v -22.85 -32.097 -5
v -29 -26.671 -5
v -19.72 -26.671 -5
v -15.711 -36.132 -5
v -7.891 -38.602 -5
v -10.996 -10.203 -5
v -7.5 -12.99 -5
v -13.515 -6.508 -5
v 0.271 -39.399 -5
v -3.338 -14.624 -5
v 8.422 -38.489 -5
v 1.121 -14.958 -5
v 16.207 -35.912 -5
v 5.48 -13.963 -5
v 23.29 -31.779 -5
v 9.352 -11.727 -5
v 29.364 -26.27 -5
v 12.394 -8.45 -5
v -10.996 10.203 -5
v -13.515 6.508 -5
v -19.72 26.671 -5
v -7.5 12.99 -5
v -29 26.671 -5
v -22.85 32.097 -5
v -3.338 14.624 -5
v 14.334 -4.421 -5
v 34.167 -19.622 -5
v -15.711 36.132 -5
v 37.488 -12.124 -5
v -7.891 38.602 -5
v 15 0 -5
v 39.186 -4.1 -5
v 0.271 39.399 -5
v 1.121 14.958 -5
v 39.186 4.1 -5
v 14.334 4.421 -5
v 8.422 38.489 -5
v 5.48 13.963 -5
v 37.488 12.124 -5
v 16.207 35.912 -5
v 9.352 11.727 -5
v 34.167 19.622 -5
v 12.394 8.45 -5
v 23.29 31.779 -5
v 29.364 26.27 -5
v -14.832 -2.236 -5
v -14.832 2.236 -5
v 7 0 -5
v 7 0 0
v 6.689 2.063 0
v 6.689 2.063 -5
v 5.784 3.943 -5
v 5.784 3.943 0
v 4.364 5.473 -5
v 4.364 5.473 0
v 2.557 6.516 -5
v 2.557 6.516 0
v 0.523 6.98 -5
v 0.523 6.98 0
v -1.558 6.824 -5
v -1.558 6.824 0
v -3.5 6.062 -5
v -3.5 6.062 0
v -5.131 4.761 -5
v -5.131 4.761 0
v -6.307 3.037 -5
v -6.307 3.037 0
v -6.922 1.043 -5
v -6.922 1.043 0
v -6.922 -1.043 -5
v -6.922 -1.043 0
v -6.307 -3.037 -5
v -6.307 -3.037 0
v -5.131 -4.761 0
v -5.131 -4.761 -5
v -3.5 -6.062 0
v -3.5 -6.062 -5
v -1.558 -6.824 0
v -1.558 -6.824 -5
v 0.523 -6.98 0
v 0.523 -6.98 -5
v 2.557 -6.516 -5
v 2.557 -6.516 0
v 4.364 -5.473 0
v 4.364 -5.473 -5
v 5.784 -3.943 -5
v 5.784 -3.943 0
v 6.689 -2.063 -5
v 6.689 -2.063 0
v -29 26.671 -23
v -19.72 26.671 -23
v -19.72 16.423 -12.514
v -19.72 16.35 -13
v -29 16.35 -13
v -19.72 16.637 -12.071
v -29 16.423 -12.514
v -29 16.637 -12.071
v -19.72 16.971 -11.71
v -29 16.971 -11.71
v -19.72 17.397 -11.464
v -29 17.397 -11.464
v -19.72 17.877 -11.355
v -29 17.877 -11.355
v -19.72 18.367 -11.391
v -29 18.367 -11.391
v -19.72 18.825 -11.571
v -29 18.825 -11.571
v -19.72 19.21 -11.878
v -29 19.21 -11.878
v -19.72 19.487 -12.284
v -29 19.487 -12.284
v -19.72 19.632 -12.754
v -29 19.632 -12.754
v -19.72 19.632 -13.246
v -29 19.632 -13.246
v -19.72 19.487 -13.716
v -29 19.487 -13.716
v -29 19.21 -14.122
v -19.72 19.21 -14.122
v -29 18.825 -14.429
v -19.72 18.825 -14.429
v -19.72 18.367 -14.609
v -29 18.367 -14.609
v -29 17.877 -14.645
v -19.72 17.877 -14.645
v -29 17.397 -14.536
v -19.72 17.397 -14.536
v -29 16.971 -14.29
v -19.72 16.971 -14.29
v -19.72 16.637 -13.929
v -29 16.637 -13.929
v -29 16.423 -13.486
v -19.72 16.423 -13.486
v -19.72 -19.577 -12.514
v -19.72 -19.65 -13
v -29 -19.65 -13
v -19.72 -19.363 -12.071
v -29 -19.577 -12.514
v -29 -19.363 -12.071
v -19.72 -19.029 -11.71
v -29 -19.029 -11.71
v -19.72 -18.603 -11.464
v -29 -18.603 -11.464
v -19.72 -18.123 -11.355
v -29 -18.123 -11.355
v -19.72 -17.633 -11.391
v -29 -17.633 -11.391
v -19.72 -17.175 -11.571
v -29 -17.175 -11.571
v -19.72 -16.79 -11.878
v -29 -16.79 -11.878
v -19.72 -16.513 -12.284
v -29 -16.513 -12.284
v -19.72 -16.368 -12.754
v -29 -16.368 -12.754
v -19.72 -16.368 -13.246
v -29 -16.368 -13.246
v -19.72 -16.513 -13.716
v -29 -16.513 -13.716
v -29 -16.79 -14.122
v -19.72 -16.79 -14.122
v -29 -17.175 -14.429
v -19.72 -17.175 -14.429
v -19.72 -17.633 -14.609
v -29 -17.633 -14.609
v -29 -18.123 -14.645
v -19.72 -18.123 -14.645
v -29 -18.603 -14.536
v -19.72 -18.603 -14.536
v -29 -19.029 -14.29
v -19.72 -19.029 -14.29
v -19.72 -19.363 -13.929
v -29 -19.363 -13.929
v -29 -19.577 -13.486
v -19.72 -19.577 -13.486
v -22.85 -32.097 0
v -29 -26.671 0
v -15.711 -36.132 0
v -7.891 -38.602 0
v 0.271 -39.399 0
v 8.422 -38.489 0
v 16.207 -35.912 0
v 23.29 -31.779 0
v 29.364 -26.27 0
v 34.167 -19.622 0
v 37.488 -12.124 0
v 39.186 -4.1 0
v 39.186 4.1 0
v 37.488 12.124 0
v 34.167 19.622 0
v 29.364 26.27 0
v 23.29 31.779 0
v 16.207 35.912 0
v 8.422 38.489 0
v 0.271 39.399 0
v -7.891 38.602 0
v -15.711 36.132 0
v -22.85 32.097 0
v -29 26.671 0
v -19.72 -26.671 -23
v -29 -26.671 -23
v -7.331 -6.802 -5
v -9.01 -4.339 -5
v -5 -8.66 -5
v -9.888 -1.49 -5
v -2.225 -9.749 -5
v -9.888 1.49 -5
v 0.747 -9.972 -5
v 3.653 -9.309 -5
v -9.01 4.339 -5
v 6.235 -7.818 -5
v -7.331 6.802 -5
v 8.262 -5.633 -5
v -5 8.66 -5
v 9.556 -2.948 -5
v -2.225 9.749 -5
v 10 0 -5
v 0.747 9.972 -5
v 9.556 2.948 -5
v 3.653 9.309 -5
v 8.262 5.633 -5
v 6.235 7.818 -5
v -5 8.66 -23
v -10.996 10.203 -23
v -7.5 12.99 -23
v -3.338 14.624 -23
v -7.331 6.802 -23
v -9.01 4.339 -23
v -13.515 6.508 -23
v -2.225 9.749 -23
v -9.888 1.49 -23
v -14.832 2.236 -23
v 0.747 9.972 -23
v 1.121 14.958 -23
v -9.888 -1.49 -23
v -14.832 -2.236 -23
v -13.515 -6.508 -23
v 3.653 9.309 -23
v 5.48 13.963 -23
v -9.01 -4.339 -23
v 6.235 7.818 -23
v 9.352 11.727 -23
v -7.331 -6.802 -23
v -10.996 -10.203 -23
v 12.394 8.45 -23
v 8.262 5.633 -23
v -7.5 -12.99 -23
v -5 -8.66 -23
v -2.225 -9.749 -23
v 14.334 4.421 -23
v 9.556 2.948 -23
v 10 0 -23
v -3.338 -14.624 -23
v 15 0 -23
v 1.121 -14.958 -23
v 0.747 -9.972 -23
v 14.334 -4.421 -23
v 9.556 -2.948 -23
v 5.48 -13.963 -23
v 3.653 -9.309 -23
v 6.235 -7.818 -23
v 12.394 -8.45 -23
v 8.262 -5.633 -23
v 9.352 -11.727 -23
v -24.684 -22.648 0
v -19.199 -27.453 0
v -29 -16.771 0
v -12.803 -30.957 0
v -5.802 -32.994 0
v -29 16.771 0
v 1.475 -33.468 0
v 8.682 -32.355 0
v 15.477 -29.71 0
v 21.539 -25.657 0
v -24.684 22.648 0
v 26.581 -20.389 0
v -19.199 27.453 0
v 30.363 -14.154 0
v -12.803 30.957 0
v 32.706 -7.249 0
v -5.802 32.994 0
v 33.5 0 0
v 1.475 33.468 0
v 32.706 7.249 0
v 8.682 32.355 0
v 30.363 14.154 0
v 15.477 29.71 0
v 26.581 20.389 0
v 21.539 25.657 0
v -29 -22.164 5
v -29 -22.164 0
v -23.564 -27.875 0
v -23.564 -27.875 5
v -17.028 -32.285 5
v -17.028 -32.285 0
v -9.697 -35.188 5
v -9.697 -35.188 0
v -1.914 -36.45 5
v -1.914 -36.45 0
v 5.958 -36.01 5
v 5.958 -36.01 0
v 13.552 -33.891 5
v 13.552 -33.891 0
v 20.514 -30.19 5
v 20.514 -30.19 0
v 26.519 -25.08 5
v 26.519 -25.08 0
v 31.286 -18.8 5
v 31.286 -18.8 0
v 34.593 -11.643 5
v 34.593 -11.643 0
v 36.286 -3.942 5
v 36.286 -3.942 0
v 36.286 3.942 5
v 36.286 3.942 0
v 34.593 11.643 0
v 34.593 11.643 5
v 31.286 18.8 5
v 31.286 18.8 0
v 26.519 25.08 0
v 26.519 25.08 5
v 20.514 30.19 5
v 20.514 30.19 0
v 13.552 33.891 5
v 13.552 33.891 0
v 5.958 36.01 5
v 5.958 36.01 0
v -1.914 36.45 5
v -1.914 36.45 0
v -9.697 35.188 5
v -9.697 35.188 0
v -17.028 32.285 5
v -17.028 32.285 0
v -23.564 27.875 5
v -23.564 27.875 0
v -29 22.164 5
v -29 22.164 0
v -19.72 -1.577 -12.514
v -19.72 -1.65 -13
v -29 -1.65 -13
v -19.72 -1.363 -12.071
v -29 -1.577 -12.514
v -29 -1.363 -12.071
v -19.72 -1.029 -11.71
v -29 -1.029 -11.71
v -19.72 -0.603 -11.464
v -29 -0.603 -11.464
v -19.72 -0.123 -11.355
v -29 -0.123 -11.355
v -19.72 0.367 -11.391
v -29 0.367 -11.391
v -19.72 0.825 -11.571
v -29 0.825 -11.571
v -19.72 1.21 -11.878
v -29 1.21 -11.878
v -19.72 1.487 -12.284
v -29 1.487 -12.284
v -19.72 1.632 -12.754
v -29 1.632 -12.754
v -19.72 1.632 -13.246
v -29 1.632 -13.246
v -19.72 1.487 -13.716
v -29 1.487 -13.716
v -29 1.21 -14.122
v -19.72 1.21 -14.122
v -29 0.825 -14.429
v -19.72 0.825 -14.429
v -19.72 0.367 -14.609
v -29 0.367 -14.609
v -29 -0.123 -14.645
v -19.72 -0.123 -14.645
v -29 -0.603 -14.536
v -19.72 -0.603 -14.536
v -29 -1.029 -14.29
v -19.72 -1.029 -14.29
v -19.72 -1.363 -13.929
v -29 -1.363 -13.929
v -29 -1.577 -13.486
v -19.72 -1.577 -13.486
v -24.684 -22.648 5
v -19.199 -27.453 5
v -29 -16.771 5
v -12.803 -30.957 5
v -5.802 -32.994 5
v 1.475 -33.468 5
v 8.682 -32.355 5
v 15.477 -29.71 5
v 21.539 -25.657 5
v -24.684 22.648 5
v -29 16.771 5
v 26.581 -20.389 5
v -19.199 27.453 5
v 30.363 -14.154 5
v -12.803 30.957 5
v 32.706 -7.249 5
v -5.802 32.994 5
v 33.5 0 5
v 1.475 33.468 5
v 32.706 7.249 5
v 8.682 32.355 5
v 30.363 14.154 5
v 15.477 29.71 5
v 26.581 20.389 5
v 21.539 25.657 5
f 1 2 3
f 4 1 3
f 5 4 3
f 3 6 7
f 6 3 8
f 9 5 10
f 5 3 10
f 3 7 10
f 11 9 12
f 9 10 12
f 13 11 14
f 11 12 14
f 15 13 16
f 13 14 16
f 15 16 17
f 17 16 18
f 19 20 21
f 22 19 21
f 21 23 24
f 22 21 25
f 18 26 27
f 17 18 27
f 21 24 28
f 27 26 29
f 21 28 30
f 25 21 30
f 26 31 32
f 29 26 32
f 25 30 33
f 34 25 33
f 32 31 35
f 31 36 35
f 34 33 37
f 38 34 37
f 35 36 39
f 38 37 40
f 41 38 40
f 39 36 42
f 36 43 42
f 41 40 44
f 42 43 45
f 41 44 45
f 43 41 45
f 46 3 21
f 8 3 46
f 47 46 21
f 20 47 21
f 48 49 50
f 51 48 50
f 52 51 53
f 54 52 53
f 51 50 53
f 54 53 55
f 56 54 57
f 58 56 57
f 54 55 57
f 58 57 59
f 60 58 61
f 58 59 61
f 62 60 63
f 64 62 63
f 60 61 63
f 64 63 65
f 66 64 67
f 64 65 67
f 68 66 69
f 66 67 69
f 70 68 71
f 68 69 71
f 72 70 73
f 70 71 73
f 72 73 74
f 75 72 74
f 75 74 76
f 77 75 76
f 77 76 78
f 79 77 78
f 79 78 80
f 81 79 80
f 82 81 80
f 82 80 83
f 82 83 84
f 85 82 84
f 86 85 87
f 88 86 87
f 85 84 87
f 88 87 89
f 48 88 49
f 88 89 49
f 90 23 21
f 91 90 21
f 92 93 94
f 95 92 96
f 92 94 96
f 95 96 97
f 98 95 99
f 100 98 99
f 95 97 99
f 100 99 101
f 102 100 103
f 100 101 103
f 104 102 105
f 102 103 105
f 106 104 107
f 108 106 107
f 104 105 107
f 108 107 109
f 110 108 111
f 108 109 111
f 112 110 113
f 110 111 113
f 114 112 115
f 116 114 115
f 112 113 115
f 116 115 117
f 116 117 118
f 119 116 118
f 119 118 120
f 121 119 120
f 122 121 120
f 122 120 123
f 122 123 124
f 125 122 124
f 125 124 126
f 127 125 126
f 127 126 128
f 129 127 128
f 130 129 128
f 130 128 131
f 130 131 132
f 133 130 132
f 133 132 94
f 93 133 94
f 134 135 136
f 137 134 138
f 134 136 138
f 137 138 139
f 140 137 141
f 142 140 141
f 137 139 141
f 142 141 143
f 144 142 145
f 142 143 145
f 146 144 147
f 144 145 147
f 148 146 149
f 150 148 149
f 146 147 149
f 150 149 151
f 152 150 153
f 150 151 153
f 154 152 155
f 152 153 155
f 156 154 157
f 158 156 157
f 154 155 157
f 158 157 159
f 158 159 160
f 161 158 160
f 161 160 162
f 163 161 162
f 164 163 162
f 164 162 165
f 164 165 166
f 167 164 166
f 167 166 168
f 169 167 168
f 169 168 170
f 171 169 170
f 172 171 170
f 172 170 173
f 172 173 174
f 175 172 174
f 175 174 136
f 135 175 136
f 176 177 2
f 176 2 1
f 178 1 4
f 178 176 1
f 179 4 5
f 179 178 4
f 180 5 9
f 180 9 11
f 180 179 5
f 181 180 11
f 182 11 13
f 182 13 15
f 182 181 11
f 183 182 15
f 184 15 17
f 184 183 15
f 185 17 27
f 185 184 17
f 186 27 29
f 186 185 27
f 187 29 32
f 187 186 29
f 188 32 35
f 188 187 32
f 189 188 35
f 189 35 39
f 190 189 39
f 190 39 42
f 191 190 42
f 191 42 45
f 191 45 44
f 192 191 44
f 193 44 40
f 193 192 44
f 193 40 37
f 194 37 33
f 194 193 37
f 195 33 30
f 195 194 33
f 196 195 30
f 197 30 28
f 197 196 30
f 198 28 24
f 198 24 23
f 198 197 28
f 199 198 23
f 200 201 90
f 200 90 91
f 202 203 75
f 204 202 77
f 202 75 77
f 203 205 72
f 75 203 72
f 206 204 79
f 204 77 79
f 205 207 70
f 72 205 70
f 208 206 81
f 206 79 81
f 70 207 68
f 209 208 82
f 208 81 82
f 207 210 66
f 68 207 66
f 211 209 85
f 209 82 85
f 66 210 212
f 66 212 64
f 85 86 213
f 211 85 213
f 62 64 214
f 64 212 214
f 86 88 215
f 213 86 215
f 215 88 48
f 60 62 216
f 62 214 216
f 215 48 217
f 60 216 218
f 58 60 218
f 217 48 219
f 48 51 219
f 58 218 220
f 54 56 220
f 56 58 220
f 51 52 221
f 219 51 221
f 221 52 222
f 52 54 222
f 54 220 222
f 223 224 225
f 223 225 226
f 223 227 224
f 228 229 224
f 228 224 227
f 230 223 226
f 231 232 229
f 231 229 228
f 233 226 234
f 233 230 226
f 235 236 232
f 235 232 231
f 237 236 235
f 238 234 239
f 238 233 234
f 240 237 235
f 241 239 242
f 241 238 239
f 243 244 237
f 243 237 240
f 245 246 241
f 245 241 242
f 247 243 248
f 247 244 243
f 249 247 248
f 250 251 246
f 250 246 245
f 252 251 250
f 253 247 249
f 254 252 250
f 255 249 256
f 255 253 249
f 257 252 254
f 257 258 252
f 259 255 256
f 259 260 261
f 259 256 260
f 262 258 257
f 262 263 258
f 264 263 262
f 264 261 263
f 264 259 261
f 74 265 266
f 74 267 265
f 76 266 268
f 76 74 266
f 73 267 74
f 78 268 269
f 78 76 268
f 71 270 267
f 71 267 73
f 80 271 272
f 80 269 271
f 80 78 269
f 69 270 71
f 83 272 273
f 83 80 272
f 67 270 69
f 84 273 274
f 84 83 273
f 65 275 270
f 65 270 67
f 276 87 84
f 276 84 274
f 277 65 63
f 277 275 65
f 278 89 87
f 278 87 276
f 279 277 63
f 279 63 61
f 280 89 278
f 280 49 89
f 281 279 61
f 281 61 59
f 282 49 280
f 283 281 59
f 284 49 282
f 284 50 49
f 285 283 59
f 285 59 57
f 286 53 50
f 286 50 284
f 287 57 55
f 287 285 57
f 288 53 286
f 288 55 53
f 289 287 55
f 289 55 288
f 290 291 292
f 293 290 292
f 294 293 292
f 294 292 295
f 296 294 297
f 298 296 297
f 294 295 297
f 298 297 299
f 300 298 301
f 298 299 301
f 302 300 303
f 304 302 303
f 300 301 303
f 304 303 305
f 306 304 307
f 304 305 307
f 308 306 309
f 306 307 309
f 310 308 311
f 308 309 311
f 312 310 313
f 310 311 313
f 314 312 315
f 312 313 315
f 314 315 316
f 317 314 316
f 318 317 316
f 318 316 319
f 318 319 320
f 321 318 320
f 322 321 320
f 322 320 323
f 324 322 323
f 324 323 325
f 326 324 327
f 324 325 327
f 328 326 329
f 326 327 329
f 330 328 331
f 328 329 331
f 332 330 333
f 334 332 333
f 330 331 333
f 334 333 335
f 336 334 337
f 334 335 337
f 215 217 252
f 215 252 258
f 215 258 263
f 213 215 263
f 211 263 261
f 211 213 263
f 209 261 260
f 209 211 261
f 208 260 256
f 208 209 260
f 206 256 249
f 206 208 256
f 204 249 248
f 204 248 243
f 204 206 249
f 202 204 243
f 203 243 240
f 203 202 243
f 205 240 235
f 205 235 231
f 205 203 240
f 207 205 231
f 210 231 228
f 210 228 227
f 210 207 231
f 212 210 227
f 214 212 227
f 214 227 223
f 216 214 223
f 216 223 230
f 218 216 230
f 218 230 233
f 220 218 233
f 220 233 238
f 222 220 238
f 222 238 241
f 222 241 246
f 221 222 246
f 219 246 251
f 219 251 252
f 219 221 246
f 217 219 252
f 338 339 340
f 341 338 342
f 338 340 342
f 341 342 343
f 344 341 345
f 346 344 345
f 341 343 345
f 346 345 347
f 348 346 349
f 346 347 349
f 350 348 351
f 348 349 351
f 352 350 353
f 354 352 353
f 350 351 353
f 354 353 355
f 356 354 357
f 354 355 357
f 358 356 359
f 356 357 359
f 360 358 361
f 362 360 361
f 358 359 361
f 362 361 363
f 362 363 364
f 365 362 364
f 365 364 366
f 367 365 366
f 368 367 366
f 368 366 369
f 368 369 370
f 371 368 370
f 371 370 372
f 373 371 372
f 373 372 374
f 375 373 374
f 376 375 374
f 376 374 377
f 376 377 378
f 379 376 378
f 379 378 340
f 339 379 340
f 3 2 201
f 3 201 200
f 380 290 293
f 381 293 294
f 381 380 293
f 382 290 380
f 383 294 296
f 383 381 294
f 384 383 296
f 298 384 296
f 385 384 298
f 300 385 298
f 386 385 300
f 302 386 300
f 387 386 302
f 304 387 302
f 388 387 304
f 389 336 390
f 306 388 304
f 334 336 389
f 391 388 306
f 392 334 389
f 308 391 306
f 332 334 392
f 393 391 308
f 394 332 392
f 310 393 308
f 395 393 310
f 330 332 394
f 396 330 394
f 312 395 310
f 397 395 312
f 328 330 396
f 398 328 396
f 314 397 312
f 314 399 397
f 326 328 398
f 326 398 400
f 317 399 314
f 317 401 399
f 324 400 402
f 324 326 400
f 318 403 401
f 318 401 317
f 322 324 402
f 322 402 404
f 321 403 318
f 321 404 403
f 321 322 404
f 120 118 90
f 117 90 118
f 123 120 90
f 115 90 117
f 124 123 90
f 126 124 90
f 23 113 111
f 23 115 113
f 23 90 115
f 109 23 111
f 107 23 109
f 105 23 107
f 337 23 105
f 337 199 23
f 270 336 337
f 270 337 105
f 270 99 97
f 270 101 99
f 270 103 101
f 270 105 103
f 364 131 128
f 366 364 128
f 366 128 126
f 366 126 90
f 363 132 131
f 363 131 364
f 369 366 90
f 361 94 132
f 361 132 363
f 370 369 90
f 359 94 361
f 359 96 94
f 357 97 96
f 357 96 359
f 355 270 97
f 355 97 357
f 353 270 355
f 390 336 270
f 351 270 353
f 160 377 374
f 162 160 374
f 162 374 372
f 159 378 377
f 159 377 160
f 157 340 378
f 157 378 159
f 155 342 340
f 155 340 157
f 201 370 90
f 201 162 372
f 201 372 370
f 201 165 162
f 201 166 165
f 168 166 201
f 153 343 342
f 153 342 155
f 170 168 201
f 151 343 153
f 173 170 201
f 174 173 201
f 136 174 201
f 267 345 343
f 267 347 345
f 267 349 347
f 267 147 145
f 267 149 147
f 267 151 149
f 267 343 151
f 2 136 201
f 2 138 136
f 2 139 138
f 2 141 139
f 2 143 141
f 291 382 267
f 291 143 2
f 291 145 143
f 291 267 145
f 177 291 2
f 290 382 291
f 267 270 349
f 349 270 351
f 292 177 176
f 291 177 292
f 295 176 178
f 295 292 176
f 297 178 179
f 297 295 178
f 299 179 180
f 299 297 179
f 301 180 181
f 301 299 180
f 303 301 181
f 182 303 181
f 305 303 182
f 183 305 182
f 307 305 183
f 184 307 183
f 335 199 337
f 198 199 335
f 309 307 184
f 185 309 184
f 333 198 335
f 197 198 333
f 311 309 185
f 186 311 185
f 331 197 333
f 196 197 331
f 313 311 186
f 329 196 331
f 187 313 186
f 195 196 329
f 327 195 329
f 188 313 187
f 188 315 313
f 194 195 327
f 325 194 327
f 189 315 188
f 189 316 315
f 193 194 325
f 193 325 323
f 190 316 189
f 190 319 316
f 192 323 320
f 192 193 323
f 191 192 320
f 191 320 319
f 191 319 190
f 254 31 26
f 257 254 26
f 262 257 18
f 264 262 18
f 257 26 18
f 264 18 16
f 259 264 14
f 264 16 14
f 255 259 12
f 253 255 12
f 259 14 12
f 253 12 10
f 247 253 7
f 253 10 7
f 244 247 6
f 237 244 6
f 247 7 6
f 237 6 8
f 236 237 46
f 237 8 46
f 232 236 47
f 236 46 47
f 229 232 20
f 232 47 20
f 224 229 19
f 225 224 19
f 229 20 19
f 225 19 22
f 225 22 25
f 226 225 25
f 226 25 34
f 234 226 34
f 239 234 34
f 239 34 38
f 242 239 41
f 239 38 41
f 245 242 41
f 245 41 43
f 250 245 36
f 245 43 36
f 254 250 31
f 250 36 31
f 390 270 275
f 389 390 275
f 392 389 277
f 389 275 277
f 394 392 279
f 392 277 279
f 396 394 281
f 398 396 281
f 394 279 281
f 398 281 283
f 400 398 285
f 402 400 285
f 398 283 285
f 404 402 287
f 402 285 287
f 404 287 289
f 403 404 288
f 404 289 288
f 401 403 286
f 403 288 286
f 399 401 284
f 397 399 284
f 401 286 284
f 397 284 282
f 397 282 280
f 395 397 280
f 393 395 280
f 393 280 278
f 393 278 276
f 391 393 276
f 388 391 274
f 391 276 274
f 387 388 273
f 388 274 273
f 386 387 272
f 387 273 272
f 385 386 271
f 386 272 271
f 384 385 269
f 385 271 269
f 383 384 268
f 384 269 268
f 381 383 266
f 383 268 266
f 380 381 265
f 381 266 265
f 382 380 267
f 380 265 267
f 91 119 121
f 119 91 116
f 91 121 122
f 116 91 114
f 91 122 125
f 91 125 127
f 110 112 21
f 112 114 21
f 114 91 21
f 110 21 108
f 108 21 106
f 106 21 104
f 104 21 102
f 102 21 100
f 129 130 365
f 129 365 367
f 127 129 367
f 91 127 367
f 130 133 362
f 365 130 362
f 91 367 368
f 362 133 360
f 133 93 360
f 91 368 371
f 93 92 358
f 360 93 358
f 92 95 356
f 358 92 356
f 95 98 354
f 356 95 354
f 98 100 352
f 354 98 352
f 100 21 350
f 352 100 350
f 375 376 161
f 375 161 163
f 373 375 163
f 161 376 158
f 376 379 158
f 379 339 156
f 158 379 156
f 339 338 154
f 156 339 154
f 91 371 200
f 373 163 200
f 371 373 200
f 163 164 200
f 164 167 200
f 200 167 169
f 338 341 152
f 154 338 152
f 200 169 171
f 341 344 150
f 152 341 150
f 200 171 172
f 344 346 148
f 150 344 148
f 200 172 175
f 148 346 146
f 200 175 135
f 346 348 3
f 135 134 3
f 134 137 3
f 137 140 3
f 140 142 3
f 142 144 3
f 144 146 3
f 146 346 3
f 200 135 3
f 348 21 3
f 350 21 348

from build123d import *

# Parameters (mm, degrees)
F1_DEPTH = 5
F0_R     = 7
F2_DEPTH = 5
F3_R     = 15
F3_R_2   = 10
F4_DEPTH = 18
F5_W     = 9.2795909345
F5_H     = 53.3426658501
F6_DEPTH = 18
F7_R     = 1.65
F8_DEPTH = 11.3


with BuildPart() as f1:
    # F0 (on Top) → F1 (new body)
    with BuildSketch(Plane.XY):
        with BuildLine():
            Line((-29, -16.7705098312), (-29, -22.1641602593))
            ThreePointArc((-29, -22.1641602593), (36.5, 0), (-29, 22.1641602593))
            Line((-29, 22.1641602593), (-29, 16.7705098312))
            ThreePointArc((-29, 16.7705098312), (33.5, 0), (-29, -16.7705098312))
        make_face()
    extrude(amount=F1_DEPTH)

    # F0 (on Top) → F2 (join)
    with BuildSketch(Plane.XY):
        with BuildLine():
            Line((-29, -22.1641602593), (-29, -26.6713329251))
            ThreePointArc((-29, -26.6713329251), (39.4, 0), (-29, 26.6713329251))
            Line((-29, 26.6713329251), (-29, 22.1641602593))
            ThreePointArc((-29, 22.1641602593), (36.5, 0), (-29, -22.1641602593))
        make_face()
        with BuildLine():
            Line((-29, -16.7705098312), (-29, -22.1641602593))
            ThreePointArc((-29, -22.1641602593), (36.5, 0), (-29, 22.1641602593))
            Line((-29, 22.1641602593), (-29, 16.7705098312))
            ThreePointArc((-29, 16.7705098312), (33.5, 0), (-29, -16.7705098312))
        make_face()
        with BuildLine():
            Line((-29, 16.7705098312), (-29, -16.7705098312))
            ThreePointArc((-29, -16.7705098312), (33.5, 0), (-29, 16.7705098312))
        make_face()
        Circle(F0_R, mode=Mode.SUBTRACT)
    extrude(amount=-F2_DEPTH)

    # F3 (on face) → F4 (join)
    with BuildSketch(Plane(origin=(0, 0, -5), x_dir=(1, 0, 0), z_dir=(0, 0, -1))):
        Circle(F3_R)
        Circle(F3_R_2, mode=Mode.SUBTRACT)
    extrude(amount=F4_DEPTH)

    # F5 (on face) → F6 (join)
    with BuildSketch(Plane(origin=(0, 0, -5), x_dir=(1, 0, 0), z_dir=(0, 0, -1))):
        with Locations((-24.3602045327, 0)):
            Rectangle(F5_W, F5_H)
    extrude(amount=F6_DEPTH)

    # F7 (on face) → F8 (cut)
    with BuildSketch(Plane(origin=(-29, 0, 0), x_dir=(0, -1, 0), z_dir=(-1, 0, 0))):
        with Locations((-18, -13)):
            Circle(F7_R)
        with Locations((0, -13)):
            Circle(F7_R)
        with Locations((18, -13)):
            Circle(F7_R)
    extrude(amount=-F8_DEPTH, mode=Mode.SUBTRACT)


solid = f1.part
